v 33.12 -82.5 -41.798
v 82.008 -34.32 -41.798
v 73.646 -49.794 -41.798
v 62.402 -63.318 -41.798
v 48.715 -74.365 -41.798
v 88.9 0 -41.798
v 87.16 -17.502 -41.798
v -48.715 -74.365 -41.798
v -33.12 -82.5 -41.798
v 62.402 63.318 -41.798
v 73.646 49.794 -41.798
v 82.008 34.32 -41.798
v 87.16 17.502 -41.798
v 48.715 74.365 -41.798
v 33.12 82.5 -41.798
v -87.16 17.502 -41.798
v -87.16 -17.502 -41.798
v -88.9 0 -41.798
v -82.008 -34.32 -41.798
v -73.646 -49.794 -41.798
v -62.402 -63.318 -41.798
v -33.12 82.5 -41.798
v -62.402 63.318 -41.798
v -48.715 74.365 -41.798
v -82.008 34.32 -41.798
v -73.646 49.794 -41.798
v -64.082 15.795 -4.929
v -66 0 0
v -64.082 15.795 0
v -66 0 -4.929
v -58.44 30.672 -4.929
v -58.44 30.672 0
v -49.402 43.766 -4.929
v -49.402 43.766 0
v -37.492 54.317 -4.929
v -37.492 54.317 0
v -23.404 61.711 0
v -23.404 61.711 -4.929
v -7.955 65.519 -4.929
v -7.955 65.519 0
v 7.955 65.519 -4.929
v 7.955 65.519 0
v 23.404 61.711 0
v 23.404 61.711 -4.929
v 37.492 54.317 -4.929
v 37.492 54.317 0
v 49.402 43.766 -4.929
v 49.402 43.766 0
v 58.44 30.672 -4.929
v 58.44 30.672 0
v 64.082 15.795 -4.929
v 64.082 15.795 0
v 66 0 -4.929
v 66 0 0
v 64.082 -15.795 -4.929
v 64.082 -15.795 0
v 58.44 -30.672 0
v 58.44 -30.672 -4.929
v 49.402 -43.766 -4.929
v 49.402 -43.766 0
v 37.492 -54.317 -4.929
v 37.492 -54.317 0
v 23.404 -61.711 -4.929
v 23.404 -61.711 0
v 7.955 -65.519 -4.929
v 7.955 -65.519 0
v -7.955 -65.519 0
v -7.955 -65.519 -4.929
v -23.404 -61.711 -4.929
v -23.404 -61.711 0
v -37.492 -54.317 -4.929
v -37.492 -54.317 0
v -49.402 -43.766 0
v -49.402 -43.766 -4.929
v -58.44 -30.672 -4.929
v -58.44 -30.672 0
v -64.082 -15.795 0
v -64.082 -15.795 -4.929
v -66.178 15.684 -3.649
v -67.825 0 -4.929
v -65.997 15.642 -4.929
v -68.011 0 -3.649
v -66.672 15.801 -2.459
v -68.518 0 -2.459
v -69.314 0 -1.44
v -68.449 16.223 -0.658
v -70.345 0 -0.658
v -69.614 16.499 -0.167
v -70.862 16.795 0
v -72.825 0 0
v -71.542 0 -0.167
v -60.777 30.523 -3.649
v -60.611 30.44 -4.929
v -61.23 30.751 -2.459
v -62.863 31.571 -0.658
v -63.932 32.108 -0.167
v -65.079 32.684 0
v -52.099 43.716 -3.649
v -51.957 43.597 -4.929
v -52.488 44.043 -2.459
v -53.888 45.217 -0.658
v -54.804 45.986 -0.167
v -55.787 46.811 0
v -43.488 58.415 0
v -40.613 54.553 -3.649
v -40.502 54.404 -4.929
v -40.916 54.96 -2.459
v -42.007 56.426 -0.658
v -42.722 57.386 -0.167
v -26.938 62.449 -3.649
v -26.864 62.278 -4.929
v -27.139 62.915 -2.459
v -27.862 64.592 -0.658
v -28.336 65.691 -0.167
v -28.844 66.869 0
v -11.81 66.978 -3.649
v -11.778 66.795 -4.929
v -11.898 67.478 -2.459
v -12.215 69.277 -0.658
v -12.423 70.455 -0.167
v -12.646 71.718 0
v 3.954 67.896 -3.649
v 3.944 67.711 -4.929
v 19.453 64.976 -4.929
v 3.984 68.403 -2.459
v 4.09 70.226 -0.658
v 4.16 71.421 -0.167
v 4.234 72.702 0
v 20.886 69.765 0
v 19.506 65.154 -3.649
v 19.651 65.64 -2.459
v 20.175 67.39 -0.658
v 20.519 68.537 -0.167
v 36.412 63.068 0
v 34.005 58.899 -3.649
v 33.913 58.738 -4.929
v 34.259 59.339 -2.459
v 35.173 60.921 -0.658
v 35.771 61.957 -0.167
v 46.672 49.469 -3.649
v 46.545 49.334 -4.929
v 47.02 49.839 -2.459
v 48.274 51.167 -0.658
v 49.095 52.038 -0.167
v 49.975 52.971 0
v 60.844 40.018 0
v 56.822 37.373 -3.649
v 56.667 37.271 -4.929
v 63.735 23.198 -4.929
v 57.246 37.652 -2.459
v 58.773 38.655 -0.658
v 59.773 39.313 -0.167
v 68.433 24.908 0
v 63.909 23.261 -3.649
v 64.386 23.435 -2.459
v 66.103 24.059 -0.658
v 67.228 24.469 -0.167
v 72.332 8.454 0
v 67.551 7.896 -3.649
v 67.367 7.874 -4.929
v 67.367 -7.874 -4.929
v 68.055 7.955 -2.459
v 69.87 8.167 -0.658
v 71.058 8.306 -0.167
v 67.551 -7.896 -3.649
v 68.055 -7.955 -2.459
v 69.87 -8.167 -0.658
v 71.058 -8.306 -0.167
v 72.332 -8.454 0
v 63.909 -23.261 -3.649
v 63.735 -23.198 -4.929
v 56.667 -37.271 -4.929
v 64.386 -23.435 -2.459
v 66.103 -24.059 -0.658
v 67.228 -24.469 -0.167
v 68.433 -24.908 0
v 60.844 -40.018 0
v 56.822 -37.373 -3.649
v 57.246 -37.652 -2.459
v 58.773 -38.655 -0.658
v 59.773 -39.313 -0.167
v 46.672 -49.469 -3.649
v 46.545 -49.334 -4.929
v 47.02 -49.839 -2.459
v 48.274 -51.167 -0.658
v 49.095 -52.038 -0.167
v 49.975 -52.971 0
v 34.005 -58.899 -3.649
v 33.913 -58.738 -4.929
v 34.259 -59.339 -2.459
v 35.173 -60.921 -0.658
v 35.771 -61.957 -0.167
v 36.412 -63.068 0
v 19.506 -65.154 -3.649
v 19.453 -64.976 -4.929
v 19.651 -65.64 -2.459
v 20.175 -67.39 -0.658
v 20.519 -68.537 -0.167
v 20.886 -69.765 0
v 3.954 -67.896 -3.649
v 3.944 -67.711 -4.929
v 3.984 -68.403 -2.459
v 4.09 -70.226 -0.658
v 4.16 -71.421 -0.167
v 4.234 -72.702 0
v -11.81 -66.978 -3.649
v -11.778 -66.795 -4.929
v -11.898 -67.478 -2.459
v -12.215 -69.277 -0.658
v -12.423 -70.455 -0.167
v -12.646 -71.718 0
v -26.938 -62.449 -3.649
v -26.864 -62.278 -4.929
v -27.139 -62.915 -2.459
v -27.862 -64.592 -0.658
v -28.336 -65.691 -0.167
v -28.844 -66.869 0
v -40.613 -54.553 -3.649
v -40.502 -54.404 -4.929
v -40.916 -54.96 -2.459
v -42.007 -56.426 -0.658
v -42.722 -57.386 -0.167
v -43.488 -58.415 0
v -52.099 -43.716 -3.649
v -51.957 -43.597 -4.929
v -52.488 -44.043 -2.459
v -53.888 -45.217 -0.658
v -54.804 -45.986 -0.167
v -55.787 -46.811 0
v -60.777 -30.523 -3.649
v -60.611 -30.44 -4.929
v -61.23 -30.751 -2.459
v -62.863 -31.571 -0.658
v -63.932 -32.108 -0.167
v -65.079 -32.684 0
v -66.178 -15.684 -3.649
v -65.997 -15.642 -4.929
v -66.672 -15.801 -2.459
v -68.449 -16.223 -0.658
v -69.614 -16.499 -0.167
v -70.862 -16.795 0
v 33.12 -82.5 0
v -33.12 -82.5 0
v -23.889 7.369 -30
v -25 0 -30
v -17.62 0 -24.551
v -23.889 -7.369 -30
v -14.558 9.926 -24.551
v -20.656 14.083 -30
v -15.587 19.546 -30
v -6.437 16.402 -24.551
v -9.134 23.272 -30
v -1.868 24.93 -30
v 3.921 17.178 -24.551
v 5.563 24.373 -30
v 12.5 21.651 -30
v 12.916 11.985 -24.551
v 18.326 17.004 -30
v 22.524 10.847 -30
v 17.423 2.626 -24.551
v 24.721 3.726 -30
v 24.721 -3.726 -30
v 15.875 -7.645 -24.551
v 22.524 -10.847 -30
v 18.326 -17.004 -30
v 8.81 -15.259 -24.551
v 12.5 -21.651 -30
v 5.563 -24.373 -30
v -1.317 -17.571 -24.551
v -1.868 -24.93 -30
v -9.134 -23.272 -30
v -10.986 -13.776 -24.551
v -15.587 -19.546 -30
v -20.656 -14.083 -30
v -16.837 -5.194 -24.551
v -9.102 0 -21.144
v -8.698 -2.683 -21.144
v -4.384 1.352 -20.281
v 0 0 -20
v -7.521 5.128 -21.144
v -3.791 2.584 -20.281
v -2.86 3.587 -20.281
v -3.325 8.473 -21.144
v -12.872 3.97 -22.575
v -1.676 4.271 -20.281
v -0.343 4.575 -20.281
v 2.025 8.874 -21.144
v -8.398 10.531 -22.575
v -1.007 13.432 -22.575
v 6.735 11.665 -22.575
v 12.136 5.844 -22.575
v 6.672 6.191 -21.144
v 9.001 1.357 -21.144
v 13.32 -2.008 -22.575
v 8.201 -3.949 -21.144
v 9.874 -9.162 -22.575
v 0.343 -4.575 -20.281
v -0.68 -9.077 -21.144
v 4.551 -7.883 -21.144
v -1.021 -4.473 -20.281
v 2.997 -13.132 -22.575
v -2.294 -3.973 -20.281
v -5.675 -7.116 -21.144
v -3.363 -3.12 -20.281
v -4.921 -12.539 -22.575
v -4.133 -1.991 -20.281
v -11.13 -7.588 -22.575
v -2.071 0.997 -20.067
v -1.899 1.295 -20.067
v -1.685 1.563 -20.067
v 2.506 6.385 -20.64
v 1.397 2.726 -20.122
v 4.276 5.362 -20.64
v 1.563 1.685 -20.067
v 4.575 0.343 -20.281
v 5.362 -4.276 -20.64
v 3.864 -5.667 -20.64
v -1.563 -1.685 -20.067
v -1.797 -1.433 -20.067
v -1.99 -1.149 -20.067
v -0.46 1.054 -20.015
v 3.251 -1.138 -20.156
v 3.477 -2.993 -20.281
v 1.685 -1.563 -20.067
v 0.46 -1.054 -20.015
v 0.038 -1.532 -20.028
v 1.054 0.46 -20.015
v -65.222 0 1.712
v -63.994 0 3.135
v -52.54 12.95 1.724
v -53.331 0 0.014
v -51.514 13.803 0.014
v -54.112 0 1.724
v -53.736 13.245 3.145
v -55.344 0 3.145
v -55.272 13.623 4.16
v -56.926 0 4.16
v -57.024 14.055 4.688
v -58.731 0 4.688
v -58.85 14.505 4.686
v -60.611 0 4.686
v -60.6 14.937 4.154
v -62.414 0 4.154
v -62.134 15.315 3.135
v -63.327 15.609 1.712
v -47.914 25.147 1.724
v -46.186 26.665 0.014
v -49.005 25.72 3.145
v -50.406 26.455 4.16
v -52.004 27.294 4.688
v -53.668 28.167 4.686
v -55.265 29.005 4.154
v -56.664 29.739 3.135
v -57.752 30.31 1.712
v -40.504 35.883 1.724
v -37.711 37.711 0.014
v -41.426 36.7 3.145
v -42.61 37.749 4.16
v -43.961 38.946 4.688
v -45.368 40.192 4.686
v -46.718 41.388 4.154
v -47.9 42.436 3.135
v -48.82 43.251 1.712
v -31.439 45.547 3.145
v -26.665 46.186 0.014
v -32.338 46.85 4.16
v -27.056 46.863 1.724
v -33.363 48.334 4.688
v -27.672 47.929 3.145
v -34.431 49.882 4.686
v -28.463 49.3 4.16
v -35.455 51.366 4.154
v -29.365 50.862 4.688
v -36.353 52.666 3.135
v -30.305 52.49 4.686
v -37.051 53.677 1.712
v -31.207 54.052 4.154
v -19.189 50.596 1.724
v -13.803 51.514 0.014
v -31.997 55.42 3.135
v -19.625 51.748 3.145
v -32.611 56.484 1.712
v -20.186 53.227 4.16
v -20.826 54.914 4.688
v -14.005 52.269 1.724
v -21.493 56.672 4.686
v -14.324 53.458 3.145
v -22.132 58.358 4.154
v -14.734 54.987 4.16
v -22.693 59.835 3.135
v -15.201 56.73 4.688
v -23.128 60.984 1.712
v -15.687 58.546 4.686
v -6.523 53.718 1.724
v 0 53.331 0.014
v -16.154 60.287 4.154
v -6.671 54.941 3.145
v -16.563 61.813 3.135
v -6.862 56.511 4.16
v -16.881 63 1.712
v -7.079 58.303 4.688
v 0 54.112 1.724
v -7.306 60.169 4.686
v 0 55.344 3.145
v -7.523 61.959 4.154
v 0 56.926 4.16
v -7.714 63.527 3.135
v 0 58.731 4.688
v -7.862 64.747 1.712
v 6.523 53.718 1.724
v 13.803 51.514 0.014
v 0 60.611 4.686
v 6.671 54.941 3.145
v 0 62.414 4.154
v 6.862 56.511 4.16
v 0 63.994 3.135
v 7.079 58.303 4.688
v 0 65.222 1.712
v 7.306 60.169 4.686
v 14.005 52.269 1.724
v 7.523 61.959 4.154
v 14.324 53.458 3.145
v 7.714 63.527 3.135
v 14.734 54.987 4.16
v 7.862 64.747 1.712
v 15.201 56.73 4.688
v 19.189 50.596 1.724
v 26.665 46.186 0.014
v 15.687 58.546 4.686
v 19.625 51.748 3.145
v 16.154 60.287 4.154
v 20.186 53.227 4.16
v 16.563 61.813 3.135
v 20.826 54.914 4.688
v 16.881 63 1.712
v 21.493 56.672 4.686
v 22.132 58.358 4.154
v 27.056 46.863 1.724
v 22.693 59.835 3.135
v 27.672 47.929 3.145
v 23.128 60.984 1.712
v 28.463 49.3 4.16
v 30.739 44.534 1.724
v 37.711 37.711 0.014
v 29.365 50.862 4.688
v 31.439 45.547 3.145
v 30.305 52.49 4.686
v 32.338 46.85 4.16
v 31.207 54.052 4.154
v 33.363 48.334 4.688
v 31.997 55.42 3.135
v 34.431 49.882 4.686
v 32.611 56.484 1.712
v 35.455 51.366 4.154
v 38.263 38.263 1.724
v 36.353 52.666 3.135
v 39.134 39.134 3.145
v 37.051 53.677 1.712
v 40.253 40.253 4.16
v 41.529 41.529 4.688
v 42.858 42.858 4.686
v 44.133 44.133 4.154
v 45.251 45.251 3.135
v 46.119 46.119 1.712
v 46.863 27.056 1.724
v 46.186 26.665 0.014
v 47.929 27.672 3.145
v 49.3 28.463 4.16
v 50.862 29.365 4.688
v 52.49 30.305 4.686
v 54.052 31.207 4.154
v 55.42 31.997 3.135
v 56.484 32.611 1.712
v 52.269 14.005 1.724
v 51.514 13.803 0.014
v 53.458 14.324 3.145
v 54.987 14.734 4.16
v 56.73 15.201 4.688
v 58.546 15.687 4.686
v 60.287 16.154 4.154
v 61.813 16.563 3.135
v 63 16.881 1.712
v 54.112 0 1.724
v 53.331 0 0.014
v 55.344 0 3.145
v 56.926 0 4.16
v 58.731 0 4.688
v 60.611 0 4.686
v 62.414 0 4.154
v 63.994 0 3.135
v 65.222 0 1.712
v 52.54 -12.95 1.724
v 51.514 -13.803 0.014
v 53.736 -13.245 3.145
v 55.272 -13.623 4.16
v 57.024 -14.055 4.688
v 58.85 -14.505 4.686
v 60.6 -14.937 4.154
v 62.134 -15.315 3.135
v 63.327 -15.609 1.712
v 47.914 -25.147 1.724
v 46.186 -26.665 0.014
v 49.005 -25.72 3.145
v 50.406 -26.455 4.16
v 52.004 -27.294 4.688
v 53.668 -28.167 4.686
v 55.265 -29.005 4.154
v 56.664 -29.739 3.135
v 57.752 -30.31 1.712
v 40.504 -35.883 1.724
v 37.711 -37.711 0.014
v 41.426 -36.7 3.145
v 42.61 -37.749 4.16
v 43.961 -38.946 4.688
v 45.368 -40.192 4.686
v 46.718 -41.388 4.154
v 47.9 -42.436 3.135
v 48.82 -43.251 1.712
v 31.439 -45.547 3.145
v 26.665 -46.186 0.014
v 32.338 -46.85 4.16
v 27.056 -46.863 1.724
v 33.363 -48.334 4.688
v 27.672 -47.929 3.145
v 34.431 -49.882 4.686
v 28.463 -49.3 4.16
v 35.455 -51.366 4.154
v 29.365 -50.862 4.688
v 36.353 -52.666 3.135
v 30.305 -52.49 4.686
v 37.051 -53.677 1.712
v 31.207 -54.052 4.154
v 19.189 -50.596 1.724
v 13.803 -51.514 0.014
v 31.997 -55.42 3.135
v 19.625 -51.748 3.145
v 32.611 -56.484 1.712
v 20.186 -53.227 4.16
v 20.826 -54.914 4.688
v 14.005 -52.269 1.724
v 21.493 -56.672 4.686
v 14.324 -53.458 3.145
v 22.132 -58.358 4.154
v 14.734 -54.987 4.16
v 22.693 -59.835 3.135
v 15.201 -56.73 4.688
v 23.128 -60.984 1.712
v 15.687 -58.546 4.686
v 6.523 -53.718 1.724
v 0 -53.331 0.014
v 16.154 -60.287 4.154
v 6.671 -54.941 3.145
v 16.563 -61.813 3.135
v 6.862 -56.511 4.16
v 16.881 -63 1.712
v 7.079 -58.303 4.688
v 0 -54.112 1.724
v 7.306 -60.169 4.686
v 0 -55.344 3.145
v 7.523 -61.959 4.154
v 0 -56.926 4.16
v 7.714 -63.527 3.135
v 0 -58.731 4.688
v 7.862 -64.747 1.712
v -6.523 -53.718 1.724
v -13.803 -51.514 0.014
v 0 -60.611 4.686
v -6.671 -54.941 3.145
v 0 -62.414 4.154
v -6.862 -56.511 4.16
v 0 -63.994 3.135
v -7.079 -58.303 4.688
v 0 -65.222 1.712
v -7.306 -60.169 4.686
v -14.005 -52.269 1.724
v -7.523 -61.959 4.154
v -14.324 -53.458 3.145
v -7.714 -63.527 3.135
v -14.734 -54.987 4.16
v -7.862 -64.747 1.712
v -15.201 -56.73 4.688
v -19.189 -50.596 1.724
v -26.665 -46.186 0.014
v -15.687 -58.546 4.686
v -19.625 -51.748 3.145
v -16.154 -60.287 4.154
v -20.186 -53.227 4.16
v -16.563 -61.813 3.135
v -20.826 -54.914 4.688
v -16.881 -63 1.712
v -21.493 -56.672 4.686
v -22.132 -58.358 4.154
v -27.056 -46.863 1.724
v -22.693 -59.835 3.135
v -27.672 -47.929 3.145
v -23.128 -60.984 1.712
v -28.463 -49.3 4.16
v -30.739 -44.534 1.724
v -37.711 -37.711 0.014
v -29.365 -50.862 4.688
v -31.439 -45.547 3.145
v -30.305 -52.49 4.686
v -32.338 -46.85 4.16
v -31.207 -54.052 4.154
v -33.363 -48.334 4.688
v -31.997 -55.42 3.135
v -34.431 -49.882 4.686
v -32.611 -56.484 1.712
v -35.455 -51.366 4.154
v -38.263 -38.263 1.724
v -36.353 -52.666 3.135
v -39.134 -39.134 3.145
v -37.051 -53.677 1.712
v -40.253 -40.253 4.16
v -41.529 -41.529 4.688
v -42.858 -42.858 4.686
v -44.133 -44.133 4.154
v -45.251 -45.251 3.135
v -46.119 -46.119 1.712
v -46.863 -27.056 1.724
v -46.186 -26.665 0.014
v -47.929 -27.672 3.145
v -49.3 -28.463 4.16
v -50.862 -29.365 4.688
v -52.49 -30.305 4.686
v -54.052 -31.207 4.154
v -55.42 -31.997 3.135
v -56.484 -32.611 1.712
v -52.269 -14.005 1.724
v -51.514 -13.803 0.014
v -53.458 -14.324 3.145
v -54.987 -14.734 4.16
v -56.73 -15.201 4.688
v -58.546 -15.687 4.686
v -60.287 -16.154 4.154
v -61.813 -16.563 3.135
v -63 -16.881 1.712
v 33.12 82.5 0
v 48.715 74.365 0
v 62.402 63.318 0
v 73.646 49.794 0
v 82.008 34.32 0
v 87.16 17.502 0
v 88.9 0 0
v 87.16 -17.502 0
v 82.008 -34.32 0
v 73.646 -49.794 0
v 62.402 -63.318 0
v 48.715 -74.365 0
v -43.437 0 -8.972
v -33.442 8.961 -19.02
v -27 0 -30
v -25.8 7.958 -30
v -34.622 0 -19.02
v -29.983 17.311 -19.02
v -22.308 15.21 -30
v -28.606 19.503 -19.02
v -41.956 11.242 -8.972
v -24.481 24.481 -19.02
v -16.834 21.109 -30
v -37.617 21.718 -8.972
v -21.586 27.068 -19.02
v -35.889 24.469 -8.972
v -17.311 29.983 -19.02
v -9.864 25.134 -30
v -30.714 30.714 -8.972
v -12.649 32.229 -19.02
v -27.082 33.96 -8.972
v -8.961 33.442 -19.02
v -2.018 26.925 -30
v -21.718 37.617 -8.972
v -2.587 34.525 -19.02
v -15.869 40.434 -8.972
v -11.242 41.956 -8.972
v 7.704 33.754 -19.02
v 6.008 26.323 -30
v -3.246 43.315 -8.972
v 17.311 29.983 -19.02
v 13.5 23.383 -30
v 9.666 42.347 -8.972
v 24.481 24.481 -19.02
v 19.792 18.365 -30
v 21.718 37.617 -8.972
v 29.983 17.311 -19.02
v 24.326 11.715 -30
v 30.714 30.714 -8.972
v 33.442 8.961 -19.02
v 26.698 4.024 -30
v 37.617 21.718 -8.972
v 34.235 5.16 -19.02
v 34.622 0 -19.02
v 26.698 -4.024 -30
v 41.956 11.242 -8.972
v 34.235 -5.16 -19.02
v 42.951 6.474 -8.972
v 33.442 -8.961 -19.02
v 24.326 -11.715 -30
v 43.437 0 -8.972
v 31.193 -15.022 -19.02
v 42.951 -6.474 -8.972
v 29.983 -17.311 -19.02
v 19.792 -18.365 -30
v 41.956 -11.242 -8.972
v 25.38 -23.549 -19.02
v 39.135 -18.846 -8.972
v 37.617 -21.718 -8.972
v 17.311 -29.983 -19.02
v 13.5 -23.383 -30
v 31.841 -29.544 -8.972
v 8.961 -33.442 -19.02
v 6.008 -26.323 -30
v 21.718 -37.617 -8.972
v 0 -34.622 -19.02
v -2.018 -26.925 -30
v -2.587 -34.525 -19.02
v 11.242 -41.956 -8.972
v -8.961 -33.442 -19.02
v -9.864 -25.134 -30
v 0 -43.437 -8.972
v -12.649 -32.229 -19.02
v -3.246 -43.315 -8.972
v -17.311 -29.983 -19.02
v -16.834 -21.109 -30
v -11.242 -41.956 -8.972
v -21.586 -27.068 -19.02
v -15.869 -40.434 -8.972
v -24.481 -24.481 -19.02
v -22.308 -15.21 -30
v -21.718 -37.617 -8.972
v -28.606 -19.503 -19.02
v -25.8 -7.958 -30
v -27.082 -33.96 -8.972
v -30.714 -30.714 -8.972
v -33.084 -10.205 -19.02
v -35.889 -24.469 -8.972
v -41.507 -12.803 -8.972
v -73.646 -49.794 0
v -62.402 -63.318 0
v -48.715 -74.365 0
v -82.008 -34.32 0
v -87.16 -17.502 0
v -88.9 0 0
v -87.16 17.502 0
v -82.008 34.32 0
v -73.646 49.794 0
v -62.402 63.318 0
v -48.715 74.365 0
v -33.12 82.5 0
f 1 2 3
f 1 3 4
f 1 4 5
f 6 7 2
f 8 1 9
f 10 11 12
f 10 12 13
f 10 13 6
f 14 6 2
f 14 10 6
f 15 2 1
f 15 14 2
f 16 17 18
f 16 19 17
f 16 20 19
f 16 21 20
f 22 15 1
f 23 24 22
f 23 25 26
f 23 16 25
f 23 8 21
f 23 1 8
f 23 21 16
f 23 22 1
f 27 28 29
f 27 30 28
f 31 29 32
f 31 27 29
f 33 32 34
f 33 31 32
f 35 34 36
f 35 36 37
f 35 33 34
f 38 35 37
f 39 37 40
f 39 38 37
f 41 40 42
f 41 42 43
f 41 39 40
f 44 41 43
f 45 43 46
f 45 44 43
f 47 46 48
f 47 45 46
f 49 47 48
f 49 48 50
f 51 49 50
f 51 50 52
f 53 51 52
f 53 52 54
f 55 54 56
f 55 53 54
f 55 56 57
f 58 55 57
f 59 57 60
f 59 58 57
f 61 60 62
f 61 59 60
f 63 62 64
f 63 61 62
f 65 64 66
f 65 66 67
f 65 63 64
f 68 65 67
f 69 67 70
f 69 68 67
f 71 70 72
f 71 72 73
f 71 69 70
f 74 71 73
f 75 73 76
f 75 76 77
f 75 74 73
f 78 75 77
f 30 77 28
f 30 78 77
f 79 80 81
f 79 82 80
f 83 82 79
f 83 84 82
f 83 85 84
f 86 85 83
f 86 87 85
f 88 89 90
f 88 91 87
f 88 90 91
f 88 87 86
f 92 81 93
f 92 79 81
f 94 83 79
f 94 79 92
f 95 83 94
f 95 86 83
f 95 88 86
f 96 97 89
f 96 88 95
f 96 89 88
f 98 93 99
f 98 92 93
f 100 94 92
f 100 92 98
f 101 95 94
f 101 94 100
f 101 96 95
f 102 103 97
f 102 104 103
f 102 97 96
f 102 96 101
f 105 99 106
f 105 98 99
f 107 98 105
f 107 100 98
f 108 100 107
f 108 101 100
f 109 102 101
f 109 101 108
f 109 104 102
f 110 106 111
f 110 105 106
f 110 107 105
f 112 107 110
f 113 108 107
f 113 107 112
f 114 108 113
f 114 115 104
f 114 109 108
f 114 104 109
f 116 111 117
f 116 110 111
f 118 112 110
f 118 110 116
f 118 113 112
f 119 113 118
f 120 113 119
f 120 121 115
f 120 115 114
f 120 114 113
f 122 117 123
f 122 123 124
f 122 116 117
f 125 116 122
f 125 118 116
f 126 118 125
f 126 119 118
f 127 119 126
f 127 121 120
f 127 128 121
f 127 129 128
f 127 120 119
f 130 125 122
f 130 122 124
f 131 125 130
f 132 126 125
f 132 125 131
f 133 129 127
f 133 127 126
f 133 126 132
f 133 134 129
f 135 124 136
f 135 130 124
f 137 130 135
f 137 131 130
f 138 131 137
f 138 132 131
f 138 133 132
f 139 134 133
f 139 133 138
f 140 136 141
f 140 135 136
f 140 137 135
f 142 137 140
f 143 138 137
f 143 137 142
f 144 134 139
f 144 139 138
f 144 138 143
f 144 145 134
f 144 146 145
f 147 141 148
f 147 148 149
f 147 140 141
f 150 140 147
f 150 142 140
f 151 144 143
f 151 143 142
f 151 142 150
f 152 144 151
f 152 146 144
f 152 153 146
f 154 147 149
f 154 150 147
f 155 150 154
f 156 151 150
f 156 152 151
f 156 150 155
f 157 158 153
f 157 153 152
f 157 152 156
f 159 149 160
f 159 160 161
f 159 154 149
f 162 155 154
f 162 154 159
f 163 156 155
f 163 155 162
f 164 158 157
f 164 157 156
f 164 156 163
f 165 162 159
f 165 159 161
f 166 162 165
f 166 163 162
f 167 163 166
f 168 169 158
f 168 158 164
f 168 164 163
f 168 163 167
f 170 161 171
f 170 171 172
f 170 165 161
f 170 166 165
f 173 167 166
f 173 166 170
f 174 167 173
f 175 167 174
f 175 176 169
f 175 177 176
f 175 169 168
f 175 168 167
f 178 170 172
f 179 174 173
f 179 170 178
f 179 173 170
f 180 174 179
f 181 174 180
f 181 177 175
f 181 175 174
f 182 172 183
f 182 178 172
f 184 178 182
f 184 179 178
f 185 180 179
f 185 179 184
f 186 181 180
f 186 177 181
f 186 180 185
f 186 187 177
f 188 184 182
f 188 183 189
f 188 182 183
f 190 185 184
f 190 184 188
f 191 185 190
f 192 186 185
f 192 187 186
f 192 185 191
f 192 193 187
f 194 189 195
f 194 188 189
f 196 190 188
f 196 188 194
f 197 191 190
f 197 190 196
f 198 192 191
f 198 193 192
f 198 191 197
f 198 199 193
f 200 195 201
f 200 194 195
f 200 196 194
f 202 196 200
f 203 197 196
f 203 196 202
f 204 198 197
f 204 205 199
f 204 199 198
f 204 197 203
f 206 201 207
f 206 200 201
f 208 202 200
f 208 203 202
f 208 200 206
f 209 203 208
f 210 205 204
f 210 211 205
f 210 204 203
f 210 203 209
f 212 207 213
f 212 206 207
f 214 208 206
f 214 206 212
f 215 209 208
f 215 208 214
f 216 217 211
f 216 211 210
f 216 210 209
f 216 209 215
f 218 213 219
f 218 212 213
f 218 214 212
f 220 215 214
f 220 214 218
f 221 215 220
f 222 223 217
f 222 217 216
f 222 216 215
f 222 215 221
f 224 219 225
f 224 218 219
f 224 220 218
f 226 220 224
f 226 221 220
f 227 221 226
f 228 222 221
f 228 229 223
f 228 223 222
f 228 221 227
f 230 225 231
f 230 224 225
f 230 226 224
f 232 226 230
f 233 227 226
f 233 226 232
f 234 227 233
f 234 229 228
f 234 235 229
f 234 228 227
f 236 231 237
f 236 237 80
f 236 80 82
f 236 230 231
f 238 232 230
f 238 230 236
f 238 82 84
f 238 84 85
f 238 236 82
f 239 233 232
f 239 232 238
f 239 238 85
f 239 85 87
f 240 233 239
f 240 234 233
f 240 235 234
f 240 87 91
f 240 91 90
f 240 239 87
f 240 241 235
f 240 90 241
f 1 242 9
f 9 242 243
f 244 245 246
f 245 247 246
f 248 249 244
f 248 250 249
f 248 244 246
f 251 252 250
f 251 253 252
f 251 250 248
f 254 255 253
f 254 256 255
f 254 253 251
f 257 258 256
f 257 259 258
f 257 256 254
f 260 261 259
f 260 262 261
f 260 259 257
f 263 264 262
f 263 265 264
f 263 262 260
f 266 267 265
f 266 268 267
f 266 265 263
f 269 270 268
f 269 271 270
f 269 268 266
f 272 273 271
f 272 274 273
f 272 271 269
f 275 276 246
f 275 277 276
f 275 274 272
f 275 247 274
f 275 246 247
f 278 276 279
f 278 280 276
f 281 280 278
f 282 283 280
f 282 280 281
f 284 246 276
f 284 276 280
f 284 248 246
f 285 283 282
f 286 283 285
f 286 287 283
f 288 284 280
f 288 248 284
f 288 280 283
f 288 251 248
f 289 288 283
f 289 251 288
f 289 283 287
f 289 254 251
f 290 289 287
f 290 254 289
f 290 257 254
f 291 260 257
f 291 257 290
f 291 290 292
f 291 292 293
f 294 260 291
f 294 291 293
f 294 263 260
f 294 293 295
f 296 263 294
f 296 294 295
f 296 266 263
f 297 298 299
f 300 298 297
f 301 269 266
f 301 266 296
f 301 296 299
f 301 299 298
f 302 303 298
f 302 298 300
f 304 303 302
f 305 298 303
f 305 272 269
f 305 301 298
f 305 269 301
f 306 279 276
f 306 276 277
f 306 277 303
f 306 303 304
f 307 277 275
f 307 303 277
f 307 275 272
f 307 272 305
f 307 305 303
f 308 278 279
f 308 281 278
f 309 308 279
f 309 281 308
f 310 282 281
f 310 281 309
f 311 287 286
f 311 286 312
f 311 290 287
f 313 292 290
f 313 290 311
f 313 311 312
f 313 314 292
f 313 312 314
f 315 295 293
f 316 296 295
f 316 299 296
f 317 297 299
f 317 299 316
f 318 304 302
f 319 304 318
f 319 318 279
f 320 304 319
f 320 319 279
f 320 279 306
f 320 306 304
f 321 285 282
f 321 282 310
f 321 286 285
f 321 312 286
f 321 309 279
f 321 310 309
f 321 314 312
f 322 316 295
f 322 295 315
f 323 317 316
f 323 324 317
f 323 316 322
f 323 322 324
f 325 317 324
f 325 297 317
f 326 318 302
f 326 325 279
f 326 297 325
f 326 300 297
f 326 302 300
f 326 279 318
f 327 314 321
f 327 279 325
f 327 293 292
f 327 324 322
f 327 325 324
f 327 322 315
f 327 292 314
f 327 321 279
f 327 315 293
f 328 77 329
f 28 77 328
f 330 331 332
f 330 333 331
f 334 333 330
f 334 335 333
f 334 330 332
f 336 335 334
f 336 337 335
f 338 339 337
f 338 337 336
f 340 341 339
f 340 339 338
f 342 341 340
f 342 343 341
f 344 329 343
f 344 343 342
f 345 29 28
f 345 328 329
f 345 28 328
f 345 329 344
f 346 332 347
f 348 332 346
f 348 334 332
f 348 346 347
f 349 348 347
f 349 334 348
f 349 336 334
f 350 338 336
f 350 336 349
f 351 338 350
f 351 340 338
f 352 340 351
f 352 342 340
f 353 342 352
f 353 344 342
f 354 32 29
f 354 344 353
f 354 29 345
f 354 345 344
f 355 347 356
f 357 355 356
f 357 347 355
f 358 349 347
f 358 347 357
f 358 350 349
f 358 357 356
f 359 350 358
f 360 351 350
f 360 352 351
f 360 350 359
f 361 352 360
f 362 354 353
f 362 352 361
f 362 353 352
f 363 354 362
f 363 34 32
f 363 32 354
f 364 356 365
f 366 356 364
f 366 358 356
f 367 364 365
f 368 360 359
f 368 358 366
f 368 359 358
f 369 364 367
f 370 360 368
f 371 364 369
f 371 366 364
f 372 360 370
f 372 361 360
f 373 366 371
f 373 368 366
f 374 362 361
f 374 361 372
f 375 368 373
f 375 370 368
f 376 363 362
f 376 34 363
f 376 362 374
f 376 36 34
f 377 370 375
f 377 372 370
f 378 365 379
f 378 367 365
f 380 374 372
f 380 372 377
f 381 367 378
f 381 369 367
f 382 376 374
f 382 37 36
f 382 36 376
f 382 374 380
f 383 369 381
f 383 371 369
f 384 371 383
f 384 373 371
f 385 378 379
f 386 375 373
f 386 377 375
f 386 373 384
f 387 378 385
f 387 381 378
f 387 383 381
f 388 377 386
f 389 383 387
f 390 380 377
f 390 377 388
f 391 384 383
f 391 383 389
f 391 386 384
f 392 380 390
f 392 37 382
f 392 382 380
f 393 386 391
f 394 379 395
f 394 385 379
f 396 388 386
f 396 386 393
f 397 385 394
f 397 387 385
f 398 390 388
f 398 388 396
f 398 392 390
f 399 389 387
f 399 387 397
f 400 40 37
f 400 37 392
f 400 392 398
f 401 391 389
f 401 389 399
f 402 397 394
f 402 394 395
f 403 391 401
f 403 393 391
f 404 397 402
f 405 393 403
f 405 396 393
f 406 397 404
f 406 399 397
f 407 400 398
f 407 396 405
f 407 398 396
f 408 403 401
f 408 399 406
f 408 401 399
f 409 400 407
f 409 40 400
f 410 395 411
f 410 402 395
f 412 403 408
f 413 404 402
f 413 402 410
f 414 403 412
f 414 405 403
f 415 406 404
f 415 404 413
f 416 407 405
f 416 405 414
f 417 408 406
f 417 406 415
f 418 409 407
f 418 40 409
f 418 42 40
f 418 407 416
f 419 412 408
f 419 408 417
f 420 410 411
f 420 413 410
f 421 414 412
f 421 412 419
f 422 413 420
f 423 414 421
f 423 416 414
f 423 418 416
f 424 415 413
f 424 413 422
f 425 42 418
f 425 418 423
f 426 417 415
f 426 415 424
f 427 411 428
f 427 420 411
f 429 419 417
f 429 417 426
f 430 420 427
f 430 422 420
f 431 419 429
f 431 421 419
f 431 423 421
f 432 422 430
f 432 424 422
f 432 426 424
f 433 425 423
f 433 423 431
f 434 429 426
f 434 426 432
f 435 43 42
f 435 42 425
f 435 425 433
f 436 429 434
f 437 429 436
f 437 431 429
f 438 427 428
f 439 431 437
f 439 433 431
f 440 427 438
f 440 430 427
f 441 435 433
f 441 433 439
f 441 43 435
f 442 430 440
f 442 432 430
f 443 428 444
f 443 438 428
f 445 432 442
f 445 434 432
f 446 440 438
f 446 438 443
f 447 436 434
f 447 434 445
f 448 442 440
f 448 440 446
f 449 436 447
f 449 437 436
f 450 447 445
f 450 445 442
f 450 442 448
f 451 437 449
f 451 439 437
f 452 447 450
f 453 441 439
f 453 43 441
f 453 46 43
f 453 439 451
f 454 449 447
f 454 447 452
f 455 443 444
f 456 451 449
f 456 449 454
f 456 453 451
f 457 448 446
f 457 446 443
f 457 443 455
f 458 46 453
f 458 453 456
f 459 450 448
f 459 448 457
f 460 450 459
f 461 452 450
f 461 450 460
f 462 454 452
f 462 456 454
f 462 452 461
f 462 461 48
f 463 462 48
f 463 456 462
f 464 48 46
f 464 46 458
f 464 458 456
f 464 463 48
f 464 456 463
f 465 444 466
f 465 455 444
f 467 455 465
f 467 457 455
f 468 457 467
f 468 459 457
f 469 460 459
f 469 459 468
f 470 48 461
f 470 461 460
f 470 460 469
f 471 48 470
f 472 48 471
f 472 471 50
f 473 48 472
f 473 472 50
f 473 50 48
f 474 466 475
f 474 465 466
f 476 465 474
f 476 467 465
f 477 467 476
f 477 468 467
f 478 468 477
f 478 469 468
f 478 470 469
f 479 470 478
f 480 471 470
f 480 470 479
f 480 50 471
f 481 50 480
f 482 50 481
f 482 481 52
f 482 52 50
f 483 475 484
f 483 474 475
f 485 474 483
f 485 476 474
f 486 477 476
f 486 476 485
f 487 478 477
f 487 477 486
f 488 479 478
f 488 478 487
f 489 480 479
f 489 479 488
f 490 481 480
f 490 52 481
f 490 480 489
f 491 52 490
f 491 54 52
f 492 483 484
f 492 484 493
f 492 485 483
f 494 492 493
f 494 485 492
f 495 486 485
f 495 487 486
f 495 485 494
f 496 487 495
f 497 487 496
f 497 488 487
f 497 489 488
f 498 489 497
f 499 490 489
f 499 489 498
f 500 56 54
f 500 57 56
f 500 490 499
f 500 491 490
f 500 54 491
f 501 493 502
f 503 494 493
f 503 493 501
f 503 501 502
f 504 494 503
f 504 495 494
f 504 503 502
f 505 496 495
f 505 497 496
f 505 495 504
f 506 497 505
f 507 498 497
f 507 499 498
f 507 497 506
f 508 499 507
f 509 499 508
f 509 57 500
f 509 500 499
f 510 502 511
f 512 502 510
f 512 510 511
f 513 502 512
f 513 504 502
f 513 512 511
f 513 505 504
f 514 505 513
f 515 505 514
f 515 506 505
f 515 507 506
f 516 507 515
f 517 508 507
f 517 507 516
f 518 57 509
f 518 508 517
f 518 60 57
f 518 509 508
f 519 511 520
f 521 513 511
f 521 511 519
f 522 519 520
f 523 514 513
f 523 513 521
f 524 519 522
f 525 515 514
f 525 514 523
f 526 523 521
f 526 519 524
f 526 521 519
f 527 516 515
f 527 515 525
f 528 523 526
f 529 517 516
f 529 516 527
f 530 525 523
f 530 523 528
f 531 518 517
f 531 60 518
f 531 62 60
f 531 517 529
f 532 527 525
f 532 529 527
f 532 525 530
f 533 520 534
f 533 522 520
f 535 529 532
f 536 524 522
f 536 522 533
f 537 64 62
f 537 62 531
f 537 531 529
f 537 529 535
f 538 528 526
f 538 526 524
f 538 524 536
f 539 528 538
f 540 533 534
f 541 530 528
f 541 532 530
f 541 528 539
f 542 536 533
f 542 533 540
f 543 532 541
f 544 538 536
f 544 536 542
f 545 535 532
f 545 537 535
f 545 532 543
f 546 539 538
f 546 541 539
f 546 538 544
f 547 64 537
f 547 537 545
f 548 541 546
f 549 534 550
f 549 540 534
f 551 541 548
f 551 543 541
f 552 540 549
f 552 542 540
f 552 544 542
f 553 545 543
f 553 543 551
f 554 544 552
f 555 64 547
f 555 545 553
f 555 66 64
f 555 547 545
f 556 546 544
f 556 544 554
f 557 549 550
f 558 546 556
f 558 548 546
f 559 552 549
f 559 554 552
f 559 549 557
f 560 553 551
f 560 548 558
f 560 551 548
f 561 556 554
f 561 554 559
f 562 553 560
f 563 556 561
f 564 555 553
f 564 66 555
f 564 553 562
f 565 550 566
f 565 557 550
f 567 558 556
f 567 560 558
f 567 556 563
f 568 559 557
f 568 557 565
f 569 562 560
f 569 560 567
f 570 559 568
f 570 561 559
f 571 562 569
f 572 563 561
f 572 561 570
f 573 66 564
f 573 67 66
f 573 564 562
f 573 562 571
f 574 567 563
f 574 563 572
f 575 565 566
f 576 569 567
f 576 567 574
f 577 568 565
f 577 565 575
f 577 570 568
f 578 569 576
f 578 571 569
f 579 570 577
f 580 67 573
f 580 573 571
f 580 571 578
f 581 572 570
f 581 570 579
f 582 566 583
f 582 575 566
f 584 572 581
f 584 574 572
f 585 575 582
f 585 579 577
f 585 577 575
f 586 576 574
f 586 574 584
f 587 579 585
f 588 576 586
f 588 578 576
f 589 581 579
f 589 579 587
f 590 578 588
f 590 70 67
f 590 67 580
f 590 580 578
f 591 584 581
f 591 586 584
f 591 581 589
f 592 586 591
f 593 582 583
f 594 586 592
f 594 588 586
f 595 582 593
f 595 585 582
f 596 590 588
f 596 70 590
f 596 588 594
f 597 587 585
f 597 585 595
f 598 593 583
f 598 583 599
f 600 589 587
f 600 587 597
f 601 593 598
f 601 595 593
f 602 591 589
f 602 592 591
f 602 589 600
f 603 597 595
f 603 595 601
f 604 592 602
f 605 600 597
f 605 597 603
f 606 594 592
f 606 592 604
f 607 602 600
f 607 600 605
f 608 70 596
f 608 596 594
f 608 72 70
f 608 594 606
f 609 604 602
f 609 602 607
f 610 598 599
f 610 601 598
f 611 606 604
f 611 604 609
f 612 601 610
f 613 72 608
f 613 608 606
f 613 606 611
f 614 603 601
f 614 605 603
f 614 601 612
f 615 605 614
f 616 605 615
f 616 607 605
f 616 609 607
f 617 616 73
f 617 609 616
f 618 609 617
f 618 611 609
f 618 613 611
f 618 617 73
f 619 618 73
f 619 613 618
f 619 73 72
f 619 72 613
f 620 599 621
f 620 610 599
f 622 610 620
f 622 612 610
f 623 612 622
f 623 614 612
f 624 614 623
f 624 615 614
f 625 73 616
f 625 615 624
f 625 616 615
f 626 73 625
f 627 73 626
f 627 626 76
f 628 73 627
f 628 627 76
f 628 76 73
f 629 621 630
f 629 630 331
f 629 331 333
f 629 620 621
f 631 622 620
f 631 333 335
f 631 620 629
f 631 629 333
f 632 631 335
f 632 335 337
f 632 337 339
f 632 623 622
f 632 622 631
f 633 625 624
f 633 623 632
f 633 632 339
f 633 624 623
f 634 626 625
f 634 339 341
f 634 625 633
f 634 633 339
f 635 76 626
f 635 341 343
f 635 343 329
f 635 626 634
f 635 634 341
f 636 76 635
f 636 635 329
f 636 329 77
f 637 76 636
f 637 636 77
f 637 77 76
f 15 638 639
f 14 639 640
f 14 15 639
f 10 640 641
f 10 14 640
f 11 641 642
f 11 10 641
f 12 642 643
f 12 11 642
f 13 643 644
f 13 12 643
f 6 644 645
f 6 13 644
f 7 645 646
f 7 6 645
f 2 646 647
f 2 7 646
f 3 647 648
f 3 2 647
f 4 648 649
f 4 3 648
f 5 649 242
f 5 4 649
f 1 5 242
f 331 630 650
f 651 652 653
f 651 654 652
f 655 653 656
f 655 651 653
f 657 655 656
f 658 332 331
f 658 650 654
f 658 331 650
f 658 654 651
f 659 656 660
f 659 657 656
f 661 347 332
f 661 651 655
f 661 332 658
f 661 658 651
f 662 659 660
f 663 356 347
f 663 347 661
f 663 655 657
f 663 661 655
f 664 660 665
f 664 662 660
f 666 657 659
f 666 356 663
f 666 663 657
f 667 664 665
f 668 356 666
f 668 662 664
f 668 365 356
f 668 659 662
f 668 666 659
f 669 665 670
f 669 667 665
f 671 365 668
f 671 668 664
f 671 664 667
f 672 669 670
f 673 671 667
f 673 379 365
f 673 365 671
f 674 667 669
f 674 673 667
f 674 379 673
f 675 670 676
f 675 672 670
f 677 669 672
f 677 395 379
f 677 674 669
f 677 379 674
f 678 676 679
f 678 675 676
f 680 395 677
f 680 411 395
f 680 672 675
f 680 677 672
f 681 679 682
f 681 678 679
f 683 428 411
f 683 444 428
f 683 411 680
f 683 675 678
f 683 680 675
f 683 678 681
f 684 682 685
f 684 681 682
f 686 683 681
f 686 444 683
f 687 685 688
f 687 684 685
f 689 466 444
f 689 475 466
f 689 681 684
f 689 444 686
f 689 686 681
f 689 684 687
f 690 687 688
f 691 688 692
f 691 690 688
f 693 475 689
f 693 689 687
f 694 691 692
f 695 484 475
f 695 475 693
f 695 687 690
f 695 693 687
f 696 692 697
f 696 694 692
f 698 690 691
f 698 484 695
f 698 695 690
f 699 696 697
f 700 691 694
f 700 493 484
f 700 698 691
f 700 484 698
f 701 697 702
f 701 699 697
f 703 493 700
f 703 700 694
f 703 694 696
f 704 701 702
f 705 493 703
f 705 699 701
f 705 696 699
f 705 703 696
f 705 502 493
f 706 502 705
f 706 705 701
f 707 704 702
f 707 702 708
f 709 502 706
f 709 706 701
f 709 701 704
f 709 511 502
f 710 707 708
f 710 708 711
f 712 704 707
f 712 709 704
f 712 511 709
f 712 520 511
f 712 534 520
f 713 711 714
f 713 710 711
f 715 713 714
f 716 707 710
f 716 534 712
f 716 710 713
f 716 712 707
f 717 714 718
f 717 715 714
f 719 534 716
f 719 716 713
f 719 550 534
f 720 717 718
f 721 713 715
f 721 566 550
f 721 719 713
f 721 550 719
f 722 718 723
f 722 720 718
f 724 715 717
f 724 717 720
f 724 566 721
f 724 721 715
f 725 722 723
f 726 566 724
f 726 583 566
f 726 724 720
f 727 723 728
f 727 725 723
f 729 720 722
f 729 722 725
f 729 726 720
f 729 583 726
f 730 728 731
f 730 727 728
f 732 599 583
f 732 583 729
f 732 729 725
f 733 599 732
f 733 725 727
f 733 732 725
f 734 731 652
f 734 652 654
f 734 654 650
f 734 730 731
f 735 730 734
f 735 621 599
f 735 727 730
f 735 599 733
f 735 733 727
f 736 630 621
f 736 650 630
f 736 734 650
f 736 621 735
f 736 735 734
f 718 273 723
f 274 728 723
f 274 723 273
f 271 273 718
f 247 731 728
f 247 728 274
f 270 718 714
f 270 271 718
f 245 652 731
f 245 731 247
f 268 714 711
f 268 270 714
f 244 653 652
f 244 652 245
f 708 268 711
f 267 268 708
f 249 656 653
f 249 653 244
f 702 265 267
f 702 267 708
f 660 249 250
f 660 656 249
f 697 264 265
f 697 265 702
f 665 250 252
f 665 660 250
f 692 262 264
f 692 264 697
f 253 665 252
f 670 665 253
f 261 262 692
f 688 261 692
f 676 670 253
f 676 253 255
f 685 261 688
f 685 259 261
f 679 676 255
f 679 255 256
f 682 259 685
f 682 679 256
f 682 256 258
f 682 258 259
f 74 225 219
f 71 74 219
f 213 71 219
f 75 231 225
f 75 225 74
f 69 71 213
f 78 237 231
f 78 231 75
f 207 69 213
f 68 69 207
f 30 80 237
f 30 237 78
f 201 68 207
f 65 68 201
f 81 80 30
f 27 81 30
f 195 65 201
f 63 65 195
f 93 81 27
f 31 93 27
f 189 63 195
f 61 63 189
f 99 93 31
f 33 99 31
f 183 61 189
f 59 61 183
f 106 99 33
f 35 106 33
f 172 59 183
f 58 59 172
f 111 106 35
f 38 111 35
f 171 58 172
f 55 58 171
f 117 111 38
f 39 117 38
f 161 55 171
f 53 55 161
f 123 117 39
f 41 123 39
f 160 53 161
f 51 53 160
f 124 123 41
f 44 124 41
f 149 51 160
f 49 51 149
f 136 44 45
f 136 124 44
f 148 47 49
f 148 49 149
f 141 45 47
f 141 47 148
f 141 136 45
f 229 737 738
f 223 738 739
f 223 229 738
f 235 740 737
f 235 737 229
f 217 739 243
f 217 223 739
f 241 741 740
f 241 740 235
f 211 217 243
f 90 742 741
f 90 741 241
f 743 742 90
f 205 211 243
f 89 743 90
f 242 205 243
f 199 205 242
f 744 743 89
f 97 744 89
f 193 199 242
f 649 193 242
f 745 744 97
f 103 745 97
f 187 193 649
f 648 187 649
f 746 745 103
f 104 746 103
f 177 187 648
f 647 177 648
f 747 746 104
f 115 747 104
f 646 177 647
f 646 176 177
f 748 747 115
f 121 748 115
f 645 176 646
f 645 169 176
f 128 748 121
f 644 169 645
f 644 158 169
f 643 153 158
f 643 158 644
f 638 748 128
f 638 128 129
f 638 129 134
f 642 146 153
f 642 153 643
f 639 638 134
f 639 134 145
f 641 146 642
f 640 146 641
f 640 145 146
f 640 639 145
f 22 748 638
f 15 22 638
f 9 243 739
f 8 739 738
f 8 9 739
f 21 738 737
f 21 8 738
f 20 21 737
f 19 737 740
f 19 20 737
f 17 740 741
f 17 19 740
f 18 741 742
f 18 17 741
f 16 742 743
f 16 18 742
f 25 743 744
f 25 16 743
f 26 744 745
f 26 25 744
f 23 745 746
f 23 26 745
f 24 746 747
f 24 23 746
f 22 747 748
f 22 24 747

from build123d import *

# Parameters (mm, degrees)
F3_DEPTH = 41.798657


with BuildPart() as f1:
    # F0 (on Front) → F1 (revolve)
    with BuildSketch(Plane.XZ):
        with BuildLine():
            ThreePointArc((-27, -30), (-38.886788, -13.87103), (-53.330974, 0.01439))
            ThreePointArc((-53.330974, 0.01439), (-59.670879, 4.754114), (-66, 0))
            Line((-66, 0), (-66, -4.929408))
            Line((-66, -4.929408), (-67.825363, -4.929408))
            ThreePointArc((-67.825363, -4.929408), (-69.314377, -1.439596), (-72.824865, 0))
            Line((-72.824865, 0), (-88.9, 0))
            Line((-88.9, 0), (-88.9, -41.797657))
            Line((-88.9, -41.797657), (0, -41.797657))
            Line((0, -41.797657), (0, -20))
            ThreePointArc((0, -20), (-13.47012, -22.5747), (-25, -30))
            Line((-25, -30), (-27, -30))
        make_face()
    revolve(axis=Axis((0, 0, -11.485694), (0, 0, -1)))

    # F2 (on face) → F3 (cut, through all)
    with BuildSketch(Plane.XY):
        Polygon((-59.565999, 82.5), (-33.120386, 82.5), (33.120386, 82.5), (63.941218, 82.5), (-2.141983, 104.541838), align=None)
        Polygon((33.120386, -82.5), (-33.120386, -82.5), (-49.083836, -82.5), (6.972946, -111.715175), (56.649286, -82.5), align=None)
    extrude(amount=-F3_DEPTH, mode=Mode.SUBTRACT)


solid = f1.part
